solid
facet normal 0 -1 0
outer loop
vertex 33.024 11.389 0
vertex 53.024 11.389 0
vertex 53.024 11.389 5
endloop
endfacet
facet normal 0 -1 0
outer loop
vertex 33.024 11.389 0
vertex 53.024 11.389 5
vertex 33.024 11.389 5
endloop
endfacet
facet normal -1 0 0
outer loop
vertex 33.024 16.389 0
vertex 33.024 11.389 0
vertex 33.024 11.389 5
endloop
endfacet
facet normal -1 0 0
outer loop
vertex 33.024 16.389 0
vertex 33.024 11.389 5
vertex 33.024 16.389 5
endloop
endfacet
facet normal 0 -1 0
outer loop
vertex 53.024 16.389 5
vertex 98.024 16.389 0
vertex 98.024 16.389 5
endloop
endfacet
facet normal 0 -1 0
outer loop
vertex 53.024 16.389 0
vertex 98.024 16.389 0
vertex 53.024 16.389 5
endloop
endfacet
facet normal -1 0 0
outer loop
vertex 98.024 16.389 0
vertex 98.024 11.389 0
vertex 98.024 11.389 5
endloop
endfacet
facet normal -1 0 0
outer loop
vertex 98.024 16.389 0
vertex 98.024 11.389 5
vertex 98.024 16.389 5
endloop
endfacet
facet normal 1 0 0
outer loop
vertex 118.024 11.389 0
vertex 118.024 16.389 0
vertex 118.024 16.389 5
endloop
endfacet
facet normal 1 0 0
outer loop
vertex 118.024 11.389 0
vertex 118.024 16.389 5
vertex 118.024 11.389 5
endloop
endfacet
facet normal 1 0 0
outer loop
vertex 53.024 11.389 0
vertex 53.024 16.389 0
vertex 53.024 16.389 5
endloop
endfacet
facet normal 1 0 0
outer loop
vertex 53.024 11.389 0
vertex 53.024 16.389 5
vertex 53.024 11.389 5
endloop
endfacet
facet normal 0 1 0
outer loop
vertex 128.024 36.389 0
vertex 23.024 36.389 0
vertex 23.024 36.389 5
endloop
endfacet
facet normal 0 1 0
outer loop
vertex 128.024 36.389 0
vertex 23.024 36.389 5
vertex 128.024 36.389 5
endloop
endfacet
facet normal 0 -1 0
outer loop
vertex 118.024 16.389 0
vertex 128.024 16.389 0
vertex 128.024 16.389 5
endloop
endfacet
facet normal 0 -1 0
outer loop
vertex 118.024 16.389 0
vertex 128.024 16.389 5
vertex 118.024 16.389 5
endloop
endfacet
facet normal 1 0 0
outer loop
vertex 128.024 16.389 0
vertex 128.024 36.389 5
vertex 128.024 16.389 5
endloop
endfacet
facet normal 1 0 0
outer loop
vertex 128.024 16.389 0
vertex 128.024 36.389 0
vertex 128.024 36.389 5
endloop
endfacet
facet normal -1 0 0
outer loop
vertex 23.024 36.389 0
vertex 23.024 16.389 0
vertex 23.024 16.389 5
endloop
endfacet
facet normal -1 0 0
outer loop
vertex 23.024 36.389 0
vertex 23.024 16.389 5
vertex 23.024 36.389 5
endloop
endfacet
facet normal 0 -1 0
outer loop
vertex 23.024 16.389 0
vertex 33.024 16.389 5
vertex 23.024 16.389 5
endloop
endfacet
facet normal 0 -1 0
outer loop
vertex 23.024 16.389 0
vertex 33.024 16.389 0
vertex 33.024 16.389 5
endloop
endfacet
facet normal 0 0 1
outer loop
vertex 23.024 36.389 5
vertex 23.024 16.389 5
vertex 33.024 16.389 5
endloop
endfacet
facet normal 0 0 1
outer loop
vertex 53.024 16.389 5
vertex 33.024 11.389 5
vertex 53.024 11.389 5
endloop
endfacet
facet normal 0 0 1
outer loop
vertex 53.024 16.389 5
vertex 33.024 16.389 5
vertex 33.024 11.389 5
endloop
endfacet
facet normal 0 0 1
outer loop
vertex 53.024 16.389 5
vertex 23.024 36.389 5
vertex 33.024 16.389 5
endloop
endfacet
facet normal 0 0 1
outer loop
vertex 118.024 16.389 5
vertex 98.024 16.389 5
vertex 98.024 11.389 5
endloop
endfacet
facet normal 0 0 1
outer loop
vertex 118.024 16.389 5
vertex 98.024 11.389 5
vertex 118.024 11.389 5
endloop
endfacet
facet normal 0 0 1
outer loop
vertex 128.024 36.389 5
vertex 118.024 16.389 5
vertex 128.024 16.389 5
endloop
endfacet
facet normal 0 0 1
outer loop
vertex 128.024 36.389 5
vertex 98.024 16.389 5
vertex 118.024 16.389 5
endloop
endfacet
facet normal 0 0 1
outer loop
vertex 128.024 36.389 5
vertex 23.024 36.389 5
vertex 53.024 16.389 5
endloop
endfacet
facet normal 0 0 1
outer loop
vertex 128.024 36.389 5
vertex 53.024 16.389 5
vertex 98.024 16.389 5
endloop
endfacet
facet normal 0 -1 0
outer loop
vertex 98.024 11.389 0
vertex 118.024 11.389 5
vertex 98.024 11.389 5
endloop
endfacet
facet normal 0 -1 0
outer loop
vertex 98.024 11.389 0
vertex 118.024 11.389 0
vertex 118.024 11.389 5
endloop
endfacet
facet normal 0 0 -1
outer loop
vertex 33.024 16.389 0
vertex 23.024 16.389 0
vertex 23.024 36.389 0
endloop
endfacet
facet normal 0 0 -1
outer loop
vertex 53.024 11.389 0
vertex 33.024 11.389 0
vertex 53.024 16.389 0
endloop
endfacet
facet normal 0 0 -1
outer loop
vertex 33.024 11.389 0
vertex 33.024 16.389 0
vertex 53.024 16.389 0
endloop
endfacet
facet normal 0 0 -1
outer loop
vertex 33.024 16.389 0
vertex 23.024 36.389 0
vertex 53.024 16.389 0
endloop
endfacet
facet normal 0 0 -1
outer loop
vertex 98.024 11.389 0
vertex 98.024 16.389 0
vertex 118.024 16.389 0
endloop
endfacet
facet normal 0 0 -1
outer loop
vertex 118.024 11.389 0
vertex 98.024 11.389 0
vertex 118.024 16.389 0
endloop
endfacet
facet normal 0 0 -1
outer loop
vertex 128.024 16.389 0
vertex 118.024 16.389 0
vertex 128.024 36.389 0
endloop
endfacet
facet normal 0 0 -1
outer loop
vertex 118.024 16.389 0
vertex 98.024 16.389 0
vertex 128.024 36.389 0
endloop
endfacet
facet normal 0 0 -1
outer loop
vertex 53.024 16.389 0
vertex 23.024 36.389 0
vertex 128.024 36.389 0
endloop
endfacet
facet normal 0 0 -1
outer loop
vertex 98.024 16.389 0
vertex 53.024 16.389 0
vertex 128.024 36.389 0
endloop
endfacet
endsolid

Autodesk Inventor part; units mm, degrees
ref_plane "YZ Plane" through (0, 0, 0) normal (1, 0, 0) x (0, 1, 0)
ref_plane "XZ Plane" through (0, 0, 0) normal (0, 1, 0) x (-1, 0, 0)
ref_plane "XY Plane" through (0, 0, 0) normal (0, 0, 1) x (1, 0, 0)
sketch "Sketch1" plane through (0, 0, 0) normal (0, 0, 1) x (1, 0, 0)
  line L0 (23.0237, 36.3892) -> (128.0237, 36.3892)
  line L1 (128.0237, 36.3892) -> (128.0237, 16.3892)
  line L2 (128.0237, 16.3892) -> (23.0237, 16.3892)
  line L3 (23.0237, 16.3892) -> (23.0237, 36.3892)
  line L4 (33.0237, 16.3892) -> (53.0237, 16.3892)
  line L5 (53.0237, 16.3892) -> (53.0237, 11.3892)
  line L6 (53.0237, 11.3892) -> (33.0237, 11.3892)
  line L7 (33.0237, 11.3892) -> (33.0237, 16.3892)
  line L8 (98.0237, 16.3892) -> (118.0237, 16.3892)
  line L9 (118.0237, 16.3892) -> (118.0237, 11.3892)
  line L10 (118.0237, 11.3892) -> (98.0237, 11.3892)
  line L11 (98.0237, 11.3892) -> (98.0237, 16.3892)
  point P0 (0, 0)
  point P1 (33.0237, 13.8892)
  dimension "d0" = 105
  dimension "d1" = 20
  dimension "d2" = 20
  dimension "d3" = 5
  dimension "d4" = 20
  dimension "d5" = 5
  dimension "d6" = 10
  dimension "d7" = 10
extrude "Extrusion1" add sketch "Sketch1" along normal blind 5
properties part number "inslide2"
